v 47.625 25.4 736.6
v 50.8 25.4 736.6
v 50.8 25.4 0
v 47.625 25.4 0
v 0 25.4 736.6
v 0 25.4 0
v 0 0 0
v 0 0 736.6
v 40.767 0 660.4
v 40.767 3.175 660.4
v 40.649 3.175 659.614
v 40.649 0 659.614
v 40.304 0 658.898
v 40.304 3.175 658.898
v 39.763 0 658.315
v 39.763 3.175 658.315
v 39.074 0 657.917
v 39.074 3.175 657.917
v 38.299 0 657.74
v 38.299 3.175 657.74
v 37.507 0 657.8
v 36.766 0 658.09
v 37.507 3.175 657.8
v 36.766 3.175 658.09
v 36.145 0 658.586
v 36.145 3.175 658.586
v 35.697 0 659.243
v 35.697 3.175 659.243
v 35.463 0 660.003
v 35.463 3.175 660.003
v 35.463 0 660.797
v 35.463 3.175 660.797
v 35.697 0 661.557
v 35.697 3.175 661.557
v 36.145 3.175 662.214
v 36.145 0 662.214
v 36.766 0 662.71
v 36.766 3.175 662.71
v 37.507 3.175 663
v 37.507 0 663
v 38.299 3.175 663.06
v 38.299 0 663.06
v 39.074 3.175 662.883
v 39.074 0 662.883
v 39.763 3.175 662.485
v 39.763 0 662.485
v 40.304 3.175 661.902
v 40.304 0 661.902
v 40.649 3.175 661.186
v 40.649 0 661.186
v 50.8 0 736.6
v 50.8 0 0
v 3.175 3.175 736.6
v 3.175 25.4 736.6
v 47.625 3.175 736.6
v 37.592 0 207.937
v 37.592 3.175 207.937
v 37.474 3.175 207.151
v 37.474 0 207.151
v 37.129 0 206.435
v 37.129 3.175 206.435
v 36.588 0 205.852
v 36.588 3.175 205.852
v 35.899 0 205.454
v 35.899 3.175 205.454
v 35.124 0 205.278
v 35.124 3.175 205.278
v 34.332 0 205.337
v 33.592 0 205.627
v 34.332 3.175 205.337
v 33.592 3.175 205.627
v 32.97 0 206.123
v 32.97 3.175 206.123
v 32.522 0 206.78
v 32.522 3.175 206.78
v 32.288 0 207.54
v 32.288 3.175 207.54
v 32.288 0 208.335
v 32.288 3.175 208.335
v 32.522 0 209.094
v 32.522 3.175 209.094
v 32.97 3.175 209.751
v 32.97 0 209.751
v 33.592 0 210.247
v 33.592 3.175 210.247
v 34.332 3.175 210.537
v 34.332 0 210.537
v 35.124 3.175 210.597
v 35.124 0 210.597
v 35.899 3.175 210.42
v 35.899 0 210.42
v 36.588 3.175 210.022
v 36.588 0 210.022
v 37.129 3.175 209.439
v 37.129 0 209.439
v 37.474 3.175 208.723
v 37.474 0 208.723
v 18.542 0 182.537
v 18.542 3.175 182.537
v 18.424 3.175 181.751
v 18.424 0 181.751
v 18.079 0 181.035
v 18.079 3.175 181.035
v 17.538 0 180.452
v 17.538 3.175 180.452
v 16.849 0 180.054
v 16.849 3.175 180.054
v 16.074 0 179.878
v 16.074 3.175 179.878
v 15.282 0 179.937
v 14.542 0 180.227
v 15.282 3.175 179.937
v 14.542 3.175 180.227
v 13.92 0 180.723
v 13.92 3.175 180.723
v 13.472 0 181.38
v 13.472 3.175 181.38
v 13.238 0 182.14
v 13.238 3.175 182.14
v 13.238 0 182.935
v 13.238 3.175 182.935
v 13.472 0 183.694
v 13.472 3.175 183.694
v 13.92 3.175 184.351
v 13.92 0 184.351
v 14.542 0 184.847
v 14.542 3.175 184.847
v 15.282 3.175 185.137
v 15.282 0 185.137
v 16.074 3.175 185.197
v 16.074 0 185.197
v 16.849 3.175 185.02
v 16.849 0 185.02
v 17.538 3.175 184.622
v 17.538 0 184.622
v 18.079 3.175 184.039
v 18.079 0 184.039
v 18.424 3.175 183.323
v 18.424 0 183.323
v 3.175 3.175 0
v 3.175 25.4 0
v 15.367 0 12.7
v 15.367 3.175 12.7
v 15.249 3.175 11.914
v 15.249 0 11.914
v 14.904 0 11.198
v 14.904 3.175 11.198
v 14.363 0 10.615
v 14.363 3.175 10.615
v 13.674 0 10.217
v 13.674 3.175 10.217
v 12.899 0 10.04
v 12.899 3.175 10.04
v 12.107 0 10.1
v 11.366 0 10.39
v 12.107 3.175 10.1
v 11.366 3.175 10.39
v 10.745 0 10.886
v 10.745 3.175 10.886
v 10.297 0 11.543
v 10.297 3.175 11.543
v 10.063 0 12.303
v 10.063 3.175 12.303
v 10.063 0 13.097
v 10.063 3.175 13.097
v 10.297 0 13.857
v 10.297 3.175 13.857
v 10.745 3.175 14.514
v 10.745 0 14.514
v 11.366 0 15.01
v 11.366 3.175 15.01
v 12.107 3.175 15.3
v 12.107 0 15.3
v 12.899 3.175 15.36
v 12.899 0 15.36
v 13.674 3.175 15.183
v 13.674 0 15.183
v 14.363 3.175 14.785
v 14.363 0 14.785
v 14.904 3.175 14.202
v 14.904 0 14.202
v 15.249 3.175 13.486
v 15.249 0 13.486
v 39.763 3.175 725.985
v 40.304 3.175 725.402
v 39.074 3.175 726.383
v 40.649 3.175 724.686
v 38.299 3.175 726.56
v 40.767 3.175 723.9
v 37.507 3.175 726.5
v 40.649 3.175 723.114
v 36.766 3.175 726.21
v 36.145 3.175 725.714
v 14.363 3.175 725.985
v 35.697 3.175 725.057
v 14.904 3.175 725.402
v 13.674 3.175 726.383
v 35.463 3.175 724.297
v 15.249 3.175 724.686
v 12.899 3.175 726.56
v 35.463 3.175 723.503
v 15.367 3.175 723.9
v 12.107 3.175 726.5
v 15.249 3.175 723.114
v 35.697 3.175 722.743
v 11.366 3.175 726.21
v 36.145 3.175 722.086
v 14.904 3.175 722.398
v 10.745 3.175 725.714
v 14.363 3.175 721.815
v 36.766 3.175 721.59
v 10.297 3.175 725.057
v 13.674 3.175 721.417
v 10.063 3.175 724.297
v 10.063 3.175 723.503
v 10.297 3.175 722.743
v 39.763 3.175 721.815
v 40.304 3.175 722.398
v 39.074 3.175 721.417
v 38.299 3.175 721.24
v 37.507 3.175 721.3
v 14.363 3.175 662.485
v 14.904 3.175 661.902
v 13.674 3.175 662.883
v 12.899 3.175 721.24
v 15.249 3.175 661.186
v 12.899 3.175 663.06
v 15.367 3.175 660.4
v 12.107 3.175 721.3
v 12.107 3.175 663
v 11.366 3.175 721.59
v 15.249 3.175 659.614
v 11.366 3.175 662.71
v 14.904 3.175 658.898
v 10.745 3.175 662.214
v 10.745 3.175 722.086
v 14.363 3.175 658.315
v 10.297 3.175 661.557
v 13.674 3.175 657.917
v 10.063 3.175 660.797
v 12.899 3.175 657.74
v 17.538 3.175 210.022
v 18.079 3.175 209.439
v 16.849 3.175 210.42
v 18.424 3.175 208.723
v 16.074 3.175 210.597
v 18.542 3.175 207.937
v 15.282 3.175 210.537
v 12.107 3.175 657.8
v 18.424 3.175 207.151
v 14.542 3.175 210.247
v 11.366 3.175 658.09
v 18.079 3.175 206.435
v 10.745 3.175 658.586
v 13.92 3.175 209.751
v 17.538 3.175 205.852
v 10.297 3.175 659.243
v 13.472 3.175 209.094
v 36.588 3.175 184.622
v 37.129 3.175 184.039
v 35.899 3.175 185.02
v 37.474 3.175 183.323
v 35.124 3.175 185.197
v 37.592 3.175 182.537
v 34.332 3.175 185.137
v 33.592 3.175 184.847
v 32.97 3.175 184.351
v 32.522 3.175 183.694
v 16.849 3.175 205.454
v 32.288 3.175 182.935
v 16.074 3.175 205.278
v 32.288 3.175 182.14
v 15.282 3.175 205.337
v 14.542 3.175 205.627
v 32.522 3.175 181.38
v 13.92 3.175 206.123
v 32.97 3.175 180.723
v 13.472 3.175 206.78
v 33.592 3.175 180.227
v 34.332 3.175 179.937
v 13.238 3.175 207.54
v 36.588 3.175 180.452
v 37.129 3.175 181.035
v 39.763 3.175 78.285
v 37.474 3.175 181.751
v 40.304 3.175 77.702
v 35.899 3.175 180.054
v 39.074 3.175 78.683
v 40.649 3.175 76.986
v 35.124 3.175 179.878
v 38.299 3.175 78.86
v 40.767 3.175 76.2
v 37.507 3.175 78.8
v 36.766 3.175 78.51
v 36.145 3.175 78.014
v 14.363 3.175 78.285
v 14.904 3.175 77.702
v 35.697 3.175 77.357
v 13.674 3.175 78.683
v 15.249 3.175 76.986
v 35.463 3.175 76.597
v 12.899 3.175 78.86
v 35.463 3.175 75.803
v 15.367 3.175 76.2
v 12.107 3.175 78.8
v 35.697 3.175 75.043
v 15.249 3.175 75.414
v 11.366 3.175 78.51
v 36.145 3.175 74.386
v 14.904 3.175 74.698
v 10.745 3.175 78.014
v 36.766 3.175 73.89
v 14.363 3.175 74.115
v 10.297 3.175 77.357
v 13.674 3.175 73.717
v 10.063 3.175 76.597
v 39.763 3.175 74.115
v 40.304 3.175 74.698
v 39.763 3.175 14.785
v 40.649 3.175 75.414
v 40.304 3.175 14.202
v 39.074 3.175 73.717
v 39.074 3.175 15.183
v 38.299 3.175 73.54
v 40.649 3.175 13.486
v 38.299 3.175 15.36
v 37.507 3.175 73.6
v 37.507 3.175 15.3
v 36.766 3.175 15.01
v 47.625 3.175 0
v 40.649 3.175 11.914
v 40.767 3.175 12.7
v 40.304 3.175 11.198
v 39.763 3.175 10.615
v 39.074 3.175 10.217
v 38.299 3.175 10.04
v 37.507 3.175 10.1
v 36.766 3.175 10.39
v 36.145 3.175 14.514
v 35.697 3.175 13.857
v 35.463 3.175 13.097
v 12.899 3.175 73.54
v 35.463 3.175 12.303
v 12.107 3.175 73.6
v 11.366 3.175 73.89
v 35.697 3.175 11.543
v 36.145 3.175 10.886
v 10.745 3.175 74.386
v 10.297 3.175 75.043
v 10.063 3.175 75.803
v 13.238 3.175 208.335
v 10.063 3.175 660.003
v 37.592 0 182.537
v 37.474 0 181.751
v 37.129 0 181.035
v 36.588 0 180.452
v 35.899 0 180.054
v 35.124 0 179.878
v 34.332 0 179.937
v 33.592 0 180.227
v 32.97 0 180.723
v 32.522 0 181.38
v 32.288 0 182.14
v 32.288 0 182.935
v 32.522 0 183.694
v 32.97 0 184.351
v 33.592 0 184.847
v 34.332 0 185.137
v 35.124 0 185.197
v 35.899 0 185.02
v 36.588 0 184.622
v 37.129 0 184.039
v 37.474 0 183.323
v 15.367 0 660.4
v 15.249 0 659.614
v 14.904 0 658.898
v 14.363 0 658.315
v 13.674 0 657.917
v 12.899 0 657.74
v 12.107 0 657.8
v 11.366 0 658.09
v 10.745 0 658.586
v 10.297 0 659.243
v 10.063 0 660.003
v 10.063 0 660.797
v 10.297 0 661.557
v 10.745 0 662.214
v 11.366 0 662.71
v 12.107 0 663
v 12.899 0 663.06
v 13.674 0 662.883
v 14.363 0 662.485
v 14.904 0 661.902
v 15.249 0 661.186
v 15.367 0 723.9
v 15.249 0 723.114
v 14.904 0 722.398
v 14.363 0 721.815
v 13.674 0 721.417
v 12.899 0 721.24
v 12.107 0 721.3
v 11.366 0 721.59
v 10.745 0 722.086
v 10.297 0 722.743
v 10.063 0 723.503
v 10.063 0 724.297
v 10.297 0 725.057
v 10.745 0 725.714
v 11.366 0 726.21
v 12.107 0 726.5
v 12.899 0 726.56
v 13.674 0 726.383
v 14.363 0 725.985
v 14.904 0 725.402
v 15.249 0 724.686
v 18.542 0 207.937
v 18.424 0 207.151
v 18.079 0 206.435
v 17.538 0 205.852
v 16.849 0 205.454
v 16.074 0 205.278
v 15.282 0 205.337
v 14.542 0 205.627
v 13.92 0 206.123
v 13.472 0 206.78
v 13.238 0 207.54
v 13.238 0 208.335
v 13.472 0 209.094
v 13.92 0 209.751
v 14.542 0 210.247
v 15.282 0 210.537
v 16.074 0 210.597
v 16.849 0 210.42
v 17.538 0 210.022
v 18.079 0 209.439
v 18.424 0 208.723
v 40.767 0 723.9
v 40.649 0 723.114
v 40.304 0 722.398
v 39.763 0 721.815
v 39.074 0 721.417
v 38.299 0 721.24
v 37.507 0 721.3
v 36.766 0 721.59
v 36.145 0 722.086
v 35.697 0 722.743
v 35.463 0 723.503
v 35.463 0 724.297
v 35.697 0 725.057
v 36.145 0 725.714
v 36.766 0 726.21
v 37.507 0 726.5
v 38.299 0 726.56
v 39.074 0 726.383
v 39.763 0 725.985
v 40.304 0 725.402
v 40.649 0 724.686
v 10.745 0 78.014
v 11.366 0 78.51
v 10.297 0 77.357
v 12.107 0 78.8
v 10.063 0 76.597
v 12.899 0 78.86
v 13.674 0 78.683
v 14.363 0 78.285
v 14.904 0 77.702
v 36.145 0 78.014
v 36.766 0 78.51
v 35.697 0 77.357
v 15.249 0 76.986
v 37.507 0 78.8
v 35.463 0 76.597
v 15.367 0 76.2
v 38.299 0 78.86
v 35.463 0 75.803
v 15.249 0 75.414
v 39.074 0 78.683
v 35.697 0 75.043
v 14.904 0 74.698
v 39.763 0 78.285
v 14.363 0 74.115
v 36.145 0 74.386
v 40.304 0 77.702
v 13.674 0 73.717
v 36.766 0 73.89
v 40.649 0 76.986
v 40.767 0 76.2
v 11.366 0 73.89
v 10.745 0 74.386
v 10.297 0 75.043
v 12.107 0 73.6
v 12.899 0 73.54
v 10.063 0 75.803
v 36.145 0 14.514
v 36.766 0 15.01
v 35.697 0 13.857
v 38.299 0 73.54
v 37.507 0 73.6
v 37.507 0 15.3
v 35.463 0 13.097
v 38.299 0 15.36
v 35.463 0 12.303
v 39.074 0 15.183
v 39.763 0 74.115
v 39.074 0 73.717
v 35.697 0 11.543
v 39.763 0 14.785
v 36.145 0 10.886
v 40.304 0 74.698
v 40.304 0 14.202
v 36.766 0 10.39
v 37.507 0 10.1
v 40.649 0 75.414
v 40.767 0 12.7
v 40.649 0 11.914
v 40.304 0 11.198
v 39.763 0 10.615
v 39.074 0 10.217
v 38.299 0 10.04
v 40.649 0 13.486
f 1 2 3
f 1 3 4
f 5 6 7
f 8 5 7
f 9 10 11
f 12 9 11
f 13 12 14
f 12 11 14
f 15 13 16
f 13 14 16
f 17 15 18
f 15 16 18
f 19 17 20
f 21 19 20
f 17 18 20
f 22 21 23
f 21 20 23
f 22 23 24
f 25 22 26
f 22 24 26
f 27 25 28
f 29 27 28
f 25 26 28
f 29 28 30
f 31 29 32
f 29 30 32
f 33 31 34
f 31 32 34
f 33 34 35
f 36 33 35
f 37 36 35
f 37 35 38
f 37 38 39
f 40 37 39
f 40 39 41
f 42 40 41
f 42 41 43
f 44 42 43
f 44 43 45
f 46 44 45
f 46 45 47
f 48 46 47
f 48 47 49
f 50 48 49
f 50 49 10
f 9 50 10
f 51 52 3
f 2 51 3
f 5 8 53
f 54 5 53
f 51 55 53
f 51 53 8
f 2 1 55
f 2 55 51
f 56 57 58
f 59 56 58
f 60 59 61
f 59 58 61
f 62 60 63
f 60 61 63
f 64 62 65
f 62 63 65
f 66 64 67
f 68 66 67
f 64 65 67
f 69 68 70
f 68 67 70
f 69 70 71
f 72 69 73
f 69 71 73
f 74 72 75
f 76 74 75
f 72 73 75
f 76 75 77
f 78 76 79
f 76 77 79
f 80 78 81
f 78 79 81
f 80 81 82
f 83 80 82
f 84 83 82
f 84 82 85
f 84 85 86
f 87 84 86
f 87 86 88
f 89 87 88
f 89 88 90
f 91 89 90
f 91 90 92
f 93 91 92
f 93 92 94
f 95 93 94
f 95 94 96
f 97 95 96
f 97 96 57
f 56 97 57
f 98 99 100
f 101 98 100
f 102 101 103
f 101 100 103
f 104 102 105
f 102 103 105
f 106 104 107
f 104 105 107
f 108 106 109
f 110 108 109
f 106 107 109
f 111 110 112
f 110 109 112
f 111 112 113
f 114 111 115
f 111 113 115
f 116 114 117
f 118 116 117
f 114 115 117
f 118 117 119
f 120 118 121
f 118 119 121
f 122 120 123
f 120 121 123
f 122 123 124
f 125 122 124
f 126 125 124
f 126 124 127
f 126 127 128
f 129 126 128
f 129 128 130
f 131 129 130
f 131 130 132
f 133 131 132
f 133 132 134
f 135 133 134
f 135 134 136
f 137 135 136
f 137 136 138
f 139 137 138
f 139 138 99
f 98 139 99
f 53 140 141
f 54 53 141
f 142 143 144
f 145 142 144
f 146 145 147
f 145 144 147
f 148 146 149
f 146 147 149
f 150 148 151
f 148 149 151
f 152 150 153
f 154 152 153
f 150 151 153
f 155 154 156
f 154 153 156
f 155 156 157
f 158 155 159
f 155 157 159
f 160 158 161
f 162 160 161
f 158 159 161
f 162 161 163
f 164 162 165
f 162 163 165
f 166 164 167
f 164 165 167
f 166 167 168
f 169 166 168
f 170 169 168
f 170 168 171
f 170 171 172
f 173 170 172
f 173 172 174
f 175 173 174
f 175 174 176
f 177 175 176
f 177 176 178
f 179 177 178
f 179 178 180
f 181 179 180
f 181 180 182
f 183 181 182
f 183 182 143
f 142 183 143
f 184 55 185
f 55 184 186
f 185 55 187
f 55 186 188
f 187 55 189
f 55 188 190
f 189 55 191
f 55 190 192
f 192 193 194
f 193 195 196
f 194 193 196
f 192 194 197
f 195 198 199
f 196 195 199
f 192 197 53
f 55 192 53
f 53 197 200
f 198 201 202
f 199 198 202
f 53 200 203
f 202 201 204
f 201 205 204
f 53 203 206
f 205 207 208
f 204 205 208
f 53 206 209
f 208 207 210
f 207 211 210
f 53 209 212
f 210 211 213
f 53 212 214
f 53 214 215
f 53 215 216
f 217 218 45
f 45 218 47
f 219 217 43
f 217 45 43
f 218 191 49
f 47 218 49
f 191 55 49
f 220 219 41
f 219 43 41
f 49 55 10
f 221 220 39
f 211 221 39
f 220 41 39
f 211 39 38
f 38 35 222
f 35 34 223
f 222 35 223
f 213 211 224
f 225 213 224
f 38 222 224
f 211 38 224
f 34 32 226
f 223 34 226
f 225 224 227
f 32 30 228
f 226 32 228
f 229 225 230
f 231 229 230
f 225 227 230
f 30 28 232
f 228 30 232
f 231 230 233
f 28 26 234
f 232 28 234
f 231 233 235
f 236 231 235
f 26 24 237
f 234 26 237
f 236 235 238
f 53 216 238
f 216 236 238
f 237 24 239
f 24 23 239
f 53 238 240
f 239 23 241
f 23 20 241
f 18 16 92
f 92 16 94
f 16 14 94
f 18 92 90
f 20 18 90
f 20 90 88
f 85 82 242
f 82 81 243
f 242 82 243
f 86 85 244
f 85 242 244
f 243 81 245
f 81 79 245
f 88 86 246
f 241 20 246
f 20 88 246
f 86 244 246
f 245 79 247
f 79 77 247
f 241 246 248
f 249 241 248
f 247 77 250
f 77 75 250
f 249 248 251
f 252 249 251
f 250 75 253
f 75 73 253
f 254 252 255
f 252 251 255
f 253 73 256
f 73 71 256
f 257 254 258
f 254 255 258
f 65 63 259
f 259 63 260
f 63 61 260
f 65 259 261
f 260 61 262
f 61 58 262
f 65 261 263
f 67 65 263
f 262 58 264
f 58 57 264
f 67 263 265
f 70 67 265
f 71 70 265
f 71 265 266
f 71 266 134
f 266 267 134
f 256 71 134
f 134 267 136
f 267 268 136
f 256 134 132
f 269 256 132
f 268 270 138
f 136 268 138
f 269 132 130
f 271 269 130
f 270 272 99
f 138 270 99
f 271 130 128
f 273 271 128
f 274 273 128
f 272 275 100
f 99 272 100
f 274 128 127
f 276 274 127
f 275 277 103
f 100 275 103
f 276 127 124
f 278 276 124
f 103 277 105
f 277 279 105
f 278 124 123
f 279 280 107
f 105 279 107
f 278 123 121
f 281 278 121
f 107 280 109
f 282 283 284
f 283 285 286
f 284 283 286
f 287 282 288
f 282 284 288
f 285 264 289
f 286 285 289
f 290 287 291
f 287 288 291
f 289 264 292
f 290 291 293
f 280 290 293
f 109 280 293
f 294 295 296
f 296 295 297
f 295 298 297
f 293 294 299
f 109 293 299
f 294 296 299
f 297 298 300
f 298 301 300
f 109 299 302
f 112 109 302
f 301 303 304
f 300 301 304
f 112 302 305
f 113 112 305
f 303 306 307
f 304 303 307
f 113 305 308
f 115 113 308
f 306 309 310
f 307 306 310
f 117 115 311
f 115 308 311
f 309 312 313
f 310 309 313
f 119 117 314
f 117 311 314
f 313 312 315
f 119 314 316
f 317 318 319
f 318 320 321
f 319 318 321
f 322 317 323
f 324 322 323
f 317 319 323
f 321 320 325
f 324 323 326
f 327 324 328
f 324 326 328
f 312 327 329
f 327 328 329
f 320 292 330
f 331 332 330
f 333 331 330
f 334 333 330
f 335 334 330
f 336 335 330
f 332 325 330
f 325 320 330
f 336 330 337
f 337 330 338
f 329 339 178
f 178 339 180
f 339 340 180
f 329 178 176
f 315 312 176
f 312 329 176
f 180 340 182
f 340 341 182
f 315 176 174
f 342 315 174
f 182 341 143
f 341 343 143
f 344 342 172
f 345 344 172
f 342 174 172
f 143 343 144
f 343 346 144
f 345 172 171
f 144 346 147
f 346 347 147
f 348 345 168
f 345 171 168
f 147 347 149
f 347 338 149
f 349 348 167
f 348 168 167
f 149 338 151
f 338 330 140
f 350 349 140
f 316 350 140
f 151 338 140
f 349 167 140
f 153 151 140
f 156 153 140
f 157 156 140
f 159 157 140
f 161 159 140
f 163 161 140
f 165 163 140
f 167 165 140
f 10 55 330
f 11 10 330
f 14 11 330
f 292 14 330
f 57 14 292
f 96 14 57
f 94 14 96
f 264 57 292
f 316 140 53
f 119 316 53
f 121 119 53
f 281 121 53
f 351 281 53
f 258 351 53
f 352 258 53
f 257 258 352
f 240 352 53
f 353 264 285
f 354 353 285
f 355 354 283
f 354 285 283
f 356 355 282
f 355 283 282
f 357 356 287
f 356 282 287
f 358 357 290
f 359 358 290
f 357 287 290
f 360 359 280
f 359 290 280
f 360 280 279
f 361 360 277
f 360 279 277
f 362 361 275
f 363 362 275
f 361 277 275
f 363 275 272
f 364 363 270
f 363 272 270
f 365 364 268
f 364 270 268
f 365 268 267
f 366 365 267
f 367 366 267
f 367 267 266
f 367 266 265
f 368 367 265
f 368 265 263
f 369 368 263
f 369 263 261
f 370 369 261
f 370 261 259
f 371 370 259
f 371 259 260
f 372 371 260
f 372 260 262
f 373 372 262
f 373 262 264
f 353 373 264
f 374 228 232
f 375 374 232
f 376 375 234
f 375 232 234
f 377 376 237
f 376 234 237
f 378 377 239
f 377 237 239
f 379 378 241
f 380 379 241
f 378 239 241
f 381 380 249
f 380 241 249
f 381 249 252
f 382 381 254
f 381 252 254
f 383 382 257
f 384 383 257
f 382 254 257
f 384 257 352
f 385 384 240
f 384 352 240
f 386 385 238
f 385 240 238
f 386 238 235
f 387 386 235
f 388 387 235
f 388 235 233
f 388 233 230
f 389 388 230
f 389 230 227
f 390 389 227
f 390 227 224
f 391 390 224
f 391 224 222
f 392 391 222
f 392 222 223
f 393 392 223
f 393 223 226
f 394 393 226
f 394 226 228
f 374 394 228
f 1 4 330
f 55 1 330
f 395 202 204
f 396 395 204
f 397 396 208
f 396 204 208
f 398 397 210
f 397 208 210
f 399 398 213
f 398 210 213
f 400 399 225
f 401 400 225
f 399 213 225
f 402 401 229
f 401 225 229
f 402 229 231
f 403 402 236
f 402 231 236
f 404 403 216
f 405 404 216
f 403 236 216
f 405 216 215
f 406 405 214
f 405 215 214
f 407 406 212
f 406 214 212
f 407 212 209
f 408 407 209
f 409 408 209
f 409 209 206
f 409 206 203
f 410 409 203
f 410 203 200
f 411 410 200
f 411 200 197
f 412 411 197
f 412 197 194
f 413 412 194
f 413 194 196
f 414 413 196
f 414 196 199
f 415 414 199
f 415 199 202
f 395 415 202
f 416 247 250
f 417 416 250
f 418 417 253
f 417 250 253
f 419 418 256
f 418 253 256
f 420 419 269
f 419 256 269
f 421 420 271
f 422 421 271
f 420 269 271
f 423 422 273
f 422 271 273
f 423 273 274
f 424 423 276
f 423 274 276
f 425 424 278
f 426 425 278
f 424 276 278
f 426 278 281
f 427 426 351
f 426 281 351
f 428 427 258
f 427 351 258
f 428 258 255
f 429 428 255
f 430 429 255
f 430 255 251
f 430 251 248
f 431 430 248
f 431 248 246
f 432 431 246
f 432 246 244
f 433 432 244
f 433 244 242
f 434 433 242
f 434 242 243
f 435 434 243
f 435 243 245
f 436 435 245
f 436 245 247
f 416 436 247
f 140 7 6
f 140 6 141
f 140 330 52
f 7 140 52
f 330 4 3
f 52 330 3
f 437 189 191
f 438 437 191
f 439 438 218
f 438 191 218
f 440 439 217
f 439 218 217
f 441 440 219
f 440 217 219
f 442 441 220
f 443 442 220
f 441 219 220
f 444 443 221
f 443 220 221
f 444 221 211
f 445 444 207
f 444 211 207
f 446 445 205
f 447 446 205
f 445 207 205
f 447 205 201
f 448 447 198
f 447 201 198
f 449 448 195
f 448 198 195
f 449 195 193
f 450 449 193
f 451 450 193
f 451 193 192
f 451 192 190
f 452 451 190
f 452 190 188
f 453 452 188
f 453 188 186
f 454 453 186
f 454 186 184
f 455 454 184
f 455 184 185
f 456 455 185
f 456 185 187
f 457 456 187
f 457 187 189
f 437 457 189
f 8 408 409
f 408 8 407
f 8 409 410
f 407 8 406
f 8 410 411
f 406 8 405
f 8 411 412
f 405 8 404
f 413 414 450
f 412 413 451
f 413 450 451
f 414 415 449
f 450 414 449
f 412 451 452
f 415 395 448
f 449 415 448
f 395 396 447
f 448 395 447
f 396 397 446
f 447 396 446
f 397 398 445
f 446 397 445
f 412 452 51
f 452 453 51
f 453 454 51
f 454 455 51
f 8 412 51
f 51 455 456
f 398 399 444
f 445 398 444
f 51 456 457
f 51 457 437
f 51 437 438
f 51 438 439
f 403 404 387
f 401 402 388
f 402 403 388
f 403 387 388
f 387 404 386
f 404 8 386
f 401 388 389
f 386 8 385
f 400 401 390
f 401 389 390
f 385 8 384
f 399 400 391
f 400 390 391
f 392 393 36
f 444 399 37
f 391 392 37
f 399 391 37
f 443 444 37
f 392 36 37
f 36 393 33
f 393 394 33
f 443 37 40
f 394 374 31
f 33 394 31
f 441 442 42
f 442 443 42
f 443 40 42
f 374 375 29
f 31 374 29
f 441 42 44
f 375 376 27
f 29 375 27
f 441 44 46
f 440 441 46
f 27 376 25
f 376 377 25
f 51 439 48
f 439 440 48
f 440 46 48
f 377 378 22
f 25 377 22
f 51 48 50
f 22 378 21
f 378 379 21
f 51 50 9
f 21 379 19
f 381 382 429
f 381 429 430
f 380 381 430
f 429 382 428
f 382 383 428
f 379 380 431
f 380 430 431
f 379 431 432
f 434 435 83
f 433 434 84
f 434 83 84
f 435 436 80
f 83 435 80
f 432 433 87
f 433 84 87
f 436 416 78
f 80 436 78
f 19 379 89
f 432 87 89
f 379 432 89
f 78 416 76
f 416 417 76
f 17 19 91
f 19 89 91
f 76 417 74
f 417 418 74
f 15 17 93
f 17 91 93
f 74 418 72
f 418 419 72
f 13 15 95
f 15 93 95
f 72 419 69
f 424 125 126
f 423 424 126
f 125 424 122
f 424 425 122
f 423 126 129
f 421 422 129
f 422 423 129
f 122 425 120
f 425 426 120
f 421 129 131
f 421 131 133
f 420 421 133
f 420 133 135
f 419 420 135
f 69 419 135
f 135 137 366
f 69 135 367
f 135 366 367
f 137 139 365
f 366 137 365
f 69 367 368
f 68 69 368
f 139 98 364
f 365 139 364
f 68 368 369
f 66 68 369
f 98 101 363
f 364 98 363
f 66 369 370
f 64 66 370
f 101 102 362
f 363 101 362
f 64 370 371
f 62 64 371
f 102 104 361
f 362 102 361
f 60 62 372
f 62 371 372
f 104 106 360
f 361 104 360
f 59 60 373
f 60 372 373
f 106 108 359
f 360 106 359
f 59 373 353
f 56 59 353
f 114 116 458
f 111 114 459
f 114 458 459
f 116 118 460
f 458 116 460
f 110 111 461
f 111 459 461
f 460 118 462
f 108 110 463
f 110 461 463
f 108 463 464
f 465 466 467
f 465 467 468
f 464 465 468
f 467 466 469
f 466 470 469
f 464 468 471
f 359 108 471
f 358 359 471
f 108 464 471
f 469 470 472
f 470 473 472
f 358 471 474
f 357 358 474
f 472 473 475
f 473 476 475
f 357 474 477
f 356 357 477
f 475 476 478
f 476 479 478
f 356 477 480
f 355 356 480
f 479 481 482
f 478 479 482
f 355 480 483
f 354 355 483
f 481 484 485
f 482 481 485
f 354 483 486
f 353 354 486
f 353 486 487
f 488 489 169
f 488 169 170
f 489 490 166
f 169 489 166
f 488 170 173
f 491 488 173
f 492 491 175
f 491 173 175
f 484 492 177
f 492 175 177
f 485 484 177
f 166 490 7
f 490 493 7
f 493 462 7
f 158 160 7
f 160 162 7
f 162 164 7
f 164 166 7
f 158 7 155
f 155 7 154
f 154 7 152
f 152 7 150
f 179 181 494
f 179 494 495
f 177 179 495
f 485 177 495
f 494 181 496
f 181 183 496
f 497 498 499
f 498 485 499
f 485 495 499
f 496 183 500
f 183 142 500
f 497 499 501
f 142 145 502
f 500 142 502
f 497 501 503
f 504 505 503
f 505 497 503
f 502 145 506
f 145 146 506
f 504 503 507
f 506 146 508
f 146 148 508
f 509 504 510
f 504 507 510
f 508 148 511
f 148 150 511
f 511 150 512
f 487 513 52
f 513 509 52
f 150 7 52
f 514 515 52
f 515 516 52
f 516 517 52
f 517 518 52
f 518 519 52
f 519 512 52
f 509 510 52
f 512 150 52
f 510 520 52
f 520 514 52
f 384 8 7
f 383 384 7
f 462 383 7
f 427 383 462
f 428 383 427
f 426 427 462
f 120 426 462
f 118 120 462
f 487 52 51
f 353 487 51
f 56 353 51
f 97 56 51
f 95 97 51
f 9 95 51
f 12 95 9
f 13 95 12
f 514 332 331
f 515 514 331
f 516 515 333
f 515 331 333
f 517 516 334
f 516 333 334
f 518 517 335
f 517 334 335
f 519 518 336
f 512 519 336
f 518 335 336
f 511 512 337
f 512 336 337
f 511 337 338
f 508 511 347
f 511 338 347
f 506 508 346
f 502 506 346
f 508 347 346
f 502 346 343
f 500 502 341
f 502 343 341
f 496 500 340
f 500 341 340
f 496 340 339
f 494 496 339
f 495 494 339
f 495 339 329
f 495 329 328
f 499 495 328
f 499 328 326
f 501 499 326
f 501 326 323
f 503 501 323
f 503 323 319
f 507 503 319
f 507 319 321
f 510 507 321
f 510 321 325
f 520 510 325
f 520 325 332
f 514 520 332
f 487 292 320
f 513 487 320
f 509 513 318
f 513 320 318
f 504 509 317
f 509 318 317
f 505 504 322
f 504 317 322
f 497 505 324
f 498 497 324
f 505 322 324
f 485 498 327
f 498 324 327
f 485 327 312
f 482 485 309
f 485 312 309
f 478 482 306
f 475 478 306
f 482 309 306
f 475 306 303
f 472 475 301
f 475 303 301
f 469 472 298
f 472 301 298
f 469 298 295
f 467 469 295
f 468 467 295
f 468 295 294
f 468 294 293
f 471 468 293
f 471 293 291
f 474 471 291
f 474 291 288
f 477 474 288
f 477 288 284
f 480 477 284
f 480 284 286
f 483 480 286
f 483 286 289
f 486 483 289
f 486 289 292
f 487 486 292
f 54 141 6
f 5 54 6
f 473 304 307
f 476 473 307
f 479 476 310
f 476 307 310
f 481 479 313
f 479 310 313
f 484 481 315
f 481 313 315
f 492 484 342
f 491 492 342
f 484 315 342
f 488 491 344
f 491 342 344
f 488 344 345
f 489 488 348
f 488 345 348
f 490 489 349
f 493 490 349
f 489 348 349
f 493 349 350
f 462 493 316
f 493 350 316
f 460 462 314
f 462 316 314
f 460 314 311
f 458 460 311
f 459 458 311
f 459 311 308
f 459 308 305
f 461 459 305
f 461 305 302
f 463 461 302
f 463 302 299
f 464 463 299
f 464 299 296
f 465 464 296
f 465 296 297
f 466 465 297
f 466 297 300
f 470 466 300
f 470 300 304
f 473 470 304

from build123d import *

# Parameters (mm, degrees)
EXTRUDE_F_DEPTH    = 736.6
CUT_EXTRUDE1_REACH = 5.175
SKETCH2_R          = 2.667
CUT_EXTRUDE2_REACH = 5.175
SKETCH3_R          = 2.667


with BuildPart() as part:
    # Sketch1 → Extrude f (new body)
    with BuildSketch(Plane.XY):
        Polygon((3.175, 3.175), (3.175, 25.4), (0, 25.4), (0, 0), (50.8, 0), (50.8, 25.4), (47.625, 25.4), (47.625, 3.175), align=None)
    extrude(amount=EXTRUDE_F_DEPTH)

    # Sketch2 → Cut-Extrude1 (cut, up to next)
    with BuildSketch(Plane(origin=(0, 3.175, 0), x_dir=(1, 0, 0), z_dir=(0, 1, 0)), mode=Mode.PRIVATE) as cut_extrude1_sk1:
        with Locations((12.7, -723.9)):
            Circle(SKETCH2_R)
    cut_extrude1_tool1 = extrude(cut_extrude1_sk1.sketch, amount=-CUT_EXTRUDE1_REACH, mode=Mode.PRIVATE) & part.part
    add(cut_extrude1_tool1.solids().sort_by_distance((12.7, 3.175, 723.9))[0], mode=Mode.SUBTRACT)
    # Sketch2 → Cut-Extrude1 (cut, up to next)
    with BuildSketch(Plane(origin=(0, 3.175, 0), x_dir=(1, 0, 0), z_dir=(0, 1, 0)), mode=Mode.PRIVATE) as cut_extrude1_sk2:
        with Locations((12.7, -660.4)):
            Circle(SKETCH2_R)
    cut_extrude1_tool2 = extrude(cut_extrude1_sk2.sketch, amount=-CUT_EXTRUDE1_REACH, mode=Mode.PRIVATE) & part.part
    add(cut_extrude1_tool2.solids().sort_by_distance((12.7, 3.175, 660.4))[0], mode=Mode.SUBTRACT)
    # Sketch2 → Cut-Extrude1 (cut, up to next)
    with BuildSketch(Plane(origin=(0, 3.175, 0), x_dir=(1, 0, 0), z_dir=(0, 1, 0)), mode=Mode.PRIVATE) as cut_extrude1_sk3:
        with Locations((38.1, -660.4)):
            Circle(SKETCH2_R)
    cut_extrude1_tool3 = extrude(cut_extrude1_sk3.sketch, amount=-CUT_EXTRUDE1_REACH, mode=Mode.PRIVATE) & part.part
    add(cut_extrude1_tool3.solids().sort_by_distance((38.1, 3.175, 660.4))[0], mode=Mode.SUBTRACT)
    # Sketch2 → Cut-Extrude1 (cut, up to next)
    with BuildSketch(Plane(origin=(0, 3.175, 0), x_dir=(1, 0, 0), z_dir=(0, 1, 0)), mode=Mode.PRIVATE) as cut_extrude1_sk4:
        with Locations((38.1, -723.9)):
            Circle(SKETCH2_R)
    cut_extrude1_tool4 = extrude(cut_extrude1_sk4.sketch, amount=-CUT_EXTRUDE1_REACH, mode=Mode.PRIVATE) & part.part
    add(cut_extrude1_tool4.solids().sort_by_distance((38.1, 3.175, 723.9))[0], mode=Mode.SUBTRACT)
    # Sketch2 → Cut-Extrude1 (cut, up to next)
    with BuildSketch(Plane(origin=(0, 3.175, 0), x_dir=(1, 0, 0), z_dir=(0, 1, 0)), mode=Mode.PRIVATE) as cut_extrude1_sk5:
        with Locations((38.1, -12.7)):
            Circle(SKETCH2_R)
    cut_extrude1_tool5 = extrude(cut_extrude1_sk5.sketch, amount=-CUT_EXTRUDE1_REACH, mode=Mode.PRIVATE) & part.part
    add(cut_extrude1_tool5.solids().sort_by_distance((38.1, 3.175, 12.7))[0], mode=Mode.SUBTRACT)
    # Sketch2 → Cut-Extrude1 (cut, up to next)
    with BuildSketch(Plane(origin=(0, 3.175, 0), x_dir=(1, 0, 0), z_dir=(0, 1, 0)), mode=Mode.PRIVATE) as cut_extrude1_sk6:
        with Locations((38.1, -76.2)):
            Circle(SKETCH2_R)
    cut_extrude1_tool6 = extrude(cut_extrude1_sk6.sketch, amount=-CUT_EXTRUDE1_REACH, mode=Mode.PRIVATE) & part.part
    add(cut_extrude1_tool6.solids().sort_by_distance((38.1, 3.175, 76.2))[0], mode=Mode.SUBTRACT)
    # Sketch2 → Cut-Extrude1 (cut, up to next)
    with BuildSketch(Plane(origin=(0, 3.175, 0), x_dir=(1, 0, 0), z_dir=(0, 1, 0)), mode=Mode.PRIVATE) as cut_extrude1_sk7:
        with Locations((12.7, -12.7)):
            Circle(SKETCH2_R)
    cut_extrude1_tool7 = extrude(cut_extrude1_sk7.sketch, amount=-CUT_EXTRUDE1_REACH, mode=Mode.PRIVATE) & part.part
    add(cut_extrude1_tool7.solids().sort_by_distance((12.7, 3.175, 12.7))[0], mode=Mode.SUBTRACT)
    # Sketch2 → Cut-Extrude1 (cut, up to next)
    with BuildSketch(Plane(origin=(0, 3.175, 0), x_dir=(1, 0, 0), z_dir=(0, 1, 0)), mode=Mode.PRIVATE) as cut_extrude1_sk8:
        with Locations((12.7, -76.2)):
            Circle(SKETCH2_R)
    cut_extrude1_tool8 = extrude(cut_extrude1_sk8.sketch, amount=-CUT_EXTRUDE1_REACH, mode=Mode.PRIVATE) & part.part
    add(cut_extrude1_tool8.solids().sort_by_distance((12.7, 3.175, 76.2))[0], mode=Mode.SUBTRACT)

    # Sketch3 → Cut-Extrude2 (cut, up to next)
    with BuildSketch(Plane(origin=(0, 3.175, 0), x_dir=(1, 0, 0), z_dir=(0, 1, 0)), mode=Mode.PRIVATE) as cut_extrude2_sk1:
        with Locations((34.925, -207.9371)):
            Circle(SKETCH3_R)
    cut_extrude2_tool1 = extrude(cut_extrude2_sk1.sketch, amount=-CUT_EXTRUDE2_REACH, mode=Mode.PRIVATE) & part.part
    add(cut_extrude2_tool1.solids().sort_by_distance((34.925, 3.175, 207.9371))[0], mode=Mode.SUBTRACT)
    # Sketch3 → Cut-Extrude2 (cut, up to next)
    with BuildSketch(Plane(origin=(0, 3.175, 0), x_dir=(1, 0, 0), z_dir=(0, 1, 0)), mode=Mode.PRIVATE) as cut_extrude2_sk2:
        with Locations((15.875, -207.9371)):
            Circle(SKETCH3_R)
    cut_extrude2_tool2 = extrude(cut_extrude2_sk2.sketch, amount=-CUT_EXTRUDE2_REACH, mode=Mode.PRIVATE) & part.part
    add(cut_extrude2_tool2.solids().sort_by_distance((15.875, 3.175, 207.9371))[0], mode=Mode.SUBTRACT)
    # Sketch3 → Cut-Extrude2 (cut, up to next)
    with BuildSketch(Plane(origin=(0, 3.175, 0), x_dir=(1, 0, 0), z_dir=(0, 1, 0)), mode=Mode.PRIVATE) as cut_extrude2_sk3:
        with Locations((34.925, -182.5371)):
            Circle(SKETCH3_R)
    cut_extrude2_tool3 = extrude(cut_extrude2_sk3.sketch, amount=-CUT_EXTRUDE2_REACH, mode=Mode.PRIVATE) & part.part
    add(cut_extrude2_tool3.solids().sort_by_distance((34.925, 3.175, 182.5371))[0], mode=Mode.SUBTRACT)
    # Sketch3 → Cut-Extrude2 (cut, up to next)
    with BuildSketch(Plane(origin=(0, 3.175, 0), x_dir=(1, 0, 0), z_dir=(0, 1, 0)), mode=Mode.PRIVATE) as cut_extrude2_sk4:
        with Locations((15.875, -182.5371)):
            Circle(SKETCH3_R)
    cut_extrude2_tool4 = extrude(cut_extrude2_sk4.sketch, amount=-CUT_EXTRUDE2_REACH, mode=Mode.PRIVATE) & part.part
    add(cut_extrude2_tool4.solids().sort_by_distance((15.875, 3.175, 182.5371))[0], mode=Mode.SUBTRACT)


solid = part.part
